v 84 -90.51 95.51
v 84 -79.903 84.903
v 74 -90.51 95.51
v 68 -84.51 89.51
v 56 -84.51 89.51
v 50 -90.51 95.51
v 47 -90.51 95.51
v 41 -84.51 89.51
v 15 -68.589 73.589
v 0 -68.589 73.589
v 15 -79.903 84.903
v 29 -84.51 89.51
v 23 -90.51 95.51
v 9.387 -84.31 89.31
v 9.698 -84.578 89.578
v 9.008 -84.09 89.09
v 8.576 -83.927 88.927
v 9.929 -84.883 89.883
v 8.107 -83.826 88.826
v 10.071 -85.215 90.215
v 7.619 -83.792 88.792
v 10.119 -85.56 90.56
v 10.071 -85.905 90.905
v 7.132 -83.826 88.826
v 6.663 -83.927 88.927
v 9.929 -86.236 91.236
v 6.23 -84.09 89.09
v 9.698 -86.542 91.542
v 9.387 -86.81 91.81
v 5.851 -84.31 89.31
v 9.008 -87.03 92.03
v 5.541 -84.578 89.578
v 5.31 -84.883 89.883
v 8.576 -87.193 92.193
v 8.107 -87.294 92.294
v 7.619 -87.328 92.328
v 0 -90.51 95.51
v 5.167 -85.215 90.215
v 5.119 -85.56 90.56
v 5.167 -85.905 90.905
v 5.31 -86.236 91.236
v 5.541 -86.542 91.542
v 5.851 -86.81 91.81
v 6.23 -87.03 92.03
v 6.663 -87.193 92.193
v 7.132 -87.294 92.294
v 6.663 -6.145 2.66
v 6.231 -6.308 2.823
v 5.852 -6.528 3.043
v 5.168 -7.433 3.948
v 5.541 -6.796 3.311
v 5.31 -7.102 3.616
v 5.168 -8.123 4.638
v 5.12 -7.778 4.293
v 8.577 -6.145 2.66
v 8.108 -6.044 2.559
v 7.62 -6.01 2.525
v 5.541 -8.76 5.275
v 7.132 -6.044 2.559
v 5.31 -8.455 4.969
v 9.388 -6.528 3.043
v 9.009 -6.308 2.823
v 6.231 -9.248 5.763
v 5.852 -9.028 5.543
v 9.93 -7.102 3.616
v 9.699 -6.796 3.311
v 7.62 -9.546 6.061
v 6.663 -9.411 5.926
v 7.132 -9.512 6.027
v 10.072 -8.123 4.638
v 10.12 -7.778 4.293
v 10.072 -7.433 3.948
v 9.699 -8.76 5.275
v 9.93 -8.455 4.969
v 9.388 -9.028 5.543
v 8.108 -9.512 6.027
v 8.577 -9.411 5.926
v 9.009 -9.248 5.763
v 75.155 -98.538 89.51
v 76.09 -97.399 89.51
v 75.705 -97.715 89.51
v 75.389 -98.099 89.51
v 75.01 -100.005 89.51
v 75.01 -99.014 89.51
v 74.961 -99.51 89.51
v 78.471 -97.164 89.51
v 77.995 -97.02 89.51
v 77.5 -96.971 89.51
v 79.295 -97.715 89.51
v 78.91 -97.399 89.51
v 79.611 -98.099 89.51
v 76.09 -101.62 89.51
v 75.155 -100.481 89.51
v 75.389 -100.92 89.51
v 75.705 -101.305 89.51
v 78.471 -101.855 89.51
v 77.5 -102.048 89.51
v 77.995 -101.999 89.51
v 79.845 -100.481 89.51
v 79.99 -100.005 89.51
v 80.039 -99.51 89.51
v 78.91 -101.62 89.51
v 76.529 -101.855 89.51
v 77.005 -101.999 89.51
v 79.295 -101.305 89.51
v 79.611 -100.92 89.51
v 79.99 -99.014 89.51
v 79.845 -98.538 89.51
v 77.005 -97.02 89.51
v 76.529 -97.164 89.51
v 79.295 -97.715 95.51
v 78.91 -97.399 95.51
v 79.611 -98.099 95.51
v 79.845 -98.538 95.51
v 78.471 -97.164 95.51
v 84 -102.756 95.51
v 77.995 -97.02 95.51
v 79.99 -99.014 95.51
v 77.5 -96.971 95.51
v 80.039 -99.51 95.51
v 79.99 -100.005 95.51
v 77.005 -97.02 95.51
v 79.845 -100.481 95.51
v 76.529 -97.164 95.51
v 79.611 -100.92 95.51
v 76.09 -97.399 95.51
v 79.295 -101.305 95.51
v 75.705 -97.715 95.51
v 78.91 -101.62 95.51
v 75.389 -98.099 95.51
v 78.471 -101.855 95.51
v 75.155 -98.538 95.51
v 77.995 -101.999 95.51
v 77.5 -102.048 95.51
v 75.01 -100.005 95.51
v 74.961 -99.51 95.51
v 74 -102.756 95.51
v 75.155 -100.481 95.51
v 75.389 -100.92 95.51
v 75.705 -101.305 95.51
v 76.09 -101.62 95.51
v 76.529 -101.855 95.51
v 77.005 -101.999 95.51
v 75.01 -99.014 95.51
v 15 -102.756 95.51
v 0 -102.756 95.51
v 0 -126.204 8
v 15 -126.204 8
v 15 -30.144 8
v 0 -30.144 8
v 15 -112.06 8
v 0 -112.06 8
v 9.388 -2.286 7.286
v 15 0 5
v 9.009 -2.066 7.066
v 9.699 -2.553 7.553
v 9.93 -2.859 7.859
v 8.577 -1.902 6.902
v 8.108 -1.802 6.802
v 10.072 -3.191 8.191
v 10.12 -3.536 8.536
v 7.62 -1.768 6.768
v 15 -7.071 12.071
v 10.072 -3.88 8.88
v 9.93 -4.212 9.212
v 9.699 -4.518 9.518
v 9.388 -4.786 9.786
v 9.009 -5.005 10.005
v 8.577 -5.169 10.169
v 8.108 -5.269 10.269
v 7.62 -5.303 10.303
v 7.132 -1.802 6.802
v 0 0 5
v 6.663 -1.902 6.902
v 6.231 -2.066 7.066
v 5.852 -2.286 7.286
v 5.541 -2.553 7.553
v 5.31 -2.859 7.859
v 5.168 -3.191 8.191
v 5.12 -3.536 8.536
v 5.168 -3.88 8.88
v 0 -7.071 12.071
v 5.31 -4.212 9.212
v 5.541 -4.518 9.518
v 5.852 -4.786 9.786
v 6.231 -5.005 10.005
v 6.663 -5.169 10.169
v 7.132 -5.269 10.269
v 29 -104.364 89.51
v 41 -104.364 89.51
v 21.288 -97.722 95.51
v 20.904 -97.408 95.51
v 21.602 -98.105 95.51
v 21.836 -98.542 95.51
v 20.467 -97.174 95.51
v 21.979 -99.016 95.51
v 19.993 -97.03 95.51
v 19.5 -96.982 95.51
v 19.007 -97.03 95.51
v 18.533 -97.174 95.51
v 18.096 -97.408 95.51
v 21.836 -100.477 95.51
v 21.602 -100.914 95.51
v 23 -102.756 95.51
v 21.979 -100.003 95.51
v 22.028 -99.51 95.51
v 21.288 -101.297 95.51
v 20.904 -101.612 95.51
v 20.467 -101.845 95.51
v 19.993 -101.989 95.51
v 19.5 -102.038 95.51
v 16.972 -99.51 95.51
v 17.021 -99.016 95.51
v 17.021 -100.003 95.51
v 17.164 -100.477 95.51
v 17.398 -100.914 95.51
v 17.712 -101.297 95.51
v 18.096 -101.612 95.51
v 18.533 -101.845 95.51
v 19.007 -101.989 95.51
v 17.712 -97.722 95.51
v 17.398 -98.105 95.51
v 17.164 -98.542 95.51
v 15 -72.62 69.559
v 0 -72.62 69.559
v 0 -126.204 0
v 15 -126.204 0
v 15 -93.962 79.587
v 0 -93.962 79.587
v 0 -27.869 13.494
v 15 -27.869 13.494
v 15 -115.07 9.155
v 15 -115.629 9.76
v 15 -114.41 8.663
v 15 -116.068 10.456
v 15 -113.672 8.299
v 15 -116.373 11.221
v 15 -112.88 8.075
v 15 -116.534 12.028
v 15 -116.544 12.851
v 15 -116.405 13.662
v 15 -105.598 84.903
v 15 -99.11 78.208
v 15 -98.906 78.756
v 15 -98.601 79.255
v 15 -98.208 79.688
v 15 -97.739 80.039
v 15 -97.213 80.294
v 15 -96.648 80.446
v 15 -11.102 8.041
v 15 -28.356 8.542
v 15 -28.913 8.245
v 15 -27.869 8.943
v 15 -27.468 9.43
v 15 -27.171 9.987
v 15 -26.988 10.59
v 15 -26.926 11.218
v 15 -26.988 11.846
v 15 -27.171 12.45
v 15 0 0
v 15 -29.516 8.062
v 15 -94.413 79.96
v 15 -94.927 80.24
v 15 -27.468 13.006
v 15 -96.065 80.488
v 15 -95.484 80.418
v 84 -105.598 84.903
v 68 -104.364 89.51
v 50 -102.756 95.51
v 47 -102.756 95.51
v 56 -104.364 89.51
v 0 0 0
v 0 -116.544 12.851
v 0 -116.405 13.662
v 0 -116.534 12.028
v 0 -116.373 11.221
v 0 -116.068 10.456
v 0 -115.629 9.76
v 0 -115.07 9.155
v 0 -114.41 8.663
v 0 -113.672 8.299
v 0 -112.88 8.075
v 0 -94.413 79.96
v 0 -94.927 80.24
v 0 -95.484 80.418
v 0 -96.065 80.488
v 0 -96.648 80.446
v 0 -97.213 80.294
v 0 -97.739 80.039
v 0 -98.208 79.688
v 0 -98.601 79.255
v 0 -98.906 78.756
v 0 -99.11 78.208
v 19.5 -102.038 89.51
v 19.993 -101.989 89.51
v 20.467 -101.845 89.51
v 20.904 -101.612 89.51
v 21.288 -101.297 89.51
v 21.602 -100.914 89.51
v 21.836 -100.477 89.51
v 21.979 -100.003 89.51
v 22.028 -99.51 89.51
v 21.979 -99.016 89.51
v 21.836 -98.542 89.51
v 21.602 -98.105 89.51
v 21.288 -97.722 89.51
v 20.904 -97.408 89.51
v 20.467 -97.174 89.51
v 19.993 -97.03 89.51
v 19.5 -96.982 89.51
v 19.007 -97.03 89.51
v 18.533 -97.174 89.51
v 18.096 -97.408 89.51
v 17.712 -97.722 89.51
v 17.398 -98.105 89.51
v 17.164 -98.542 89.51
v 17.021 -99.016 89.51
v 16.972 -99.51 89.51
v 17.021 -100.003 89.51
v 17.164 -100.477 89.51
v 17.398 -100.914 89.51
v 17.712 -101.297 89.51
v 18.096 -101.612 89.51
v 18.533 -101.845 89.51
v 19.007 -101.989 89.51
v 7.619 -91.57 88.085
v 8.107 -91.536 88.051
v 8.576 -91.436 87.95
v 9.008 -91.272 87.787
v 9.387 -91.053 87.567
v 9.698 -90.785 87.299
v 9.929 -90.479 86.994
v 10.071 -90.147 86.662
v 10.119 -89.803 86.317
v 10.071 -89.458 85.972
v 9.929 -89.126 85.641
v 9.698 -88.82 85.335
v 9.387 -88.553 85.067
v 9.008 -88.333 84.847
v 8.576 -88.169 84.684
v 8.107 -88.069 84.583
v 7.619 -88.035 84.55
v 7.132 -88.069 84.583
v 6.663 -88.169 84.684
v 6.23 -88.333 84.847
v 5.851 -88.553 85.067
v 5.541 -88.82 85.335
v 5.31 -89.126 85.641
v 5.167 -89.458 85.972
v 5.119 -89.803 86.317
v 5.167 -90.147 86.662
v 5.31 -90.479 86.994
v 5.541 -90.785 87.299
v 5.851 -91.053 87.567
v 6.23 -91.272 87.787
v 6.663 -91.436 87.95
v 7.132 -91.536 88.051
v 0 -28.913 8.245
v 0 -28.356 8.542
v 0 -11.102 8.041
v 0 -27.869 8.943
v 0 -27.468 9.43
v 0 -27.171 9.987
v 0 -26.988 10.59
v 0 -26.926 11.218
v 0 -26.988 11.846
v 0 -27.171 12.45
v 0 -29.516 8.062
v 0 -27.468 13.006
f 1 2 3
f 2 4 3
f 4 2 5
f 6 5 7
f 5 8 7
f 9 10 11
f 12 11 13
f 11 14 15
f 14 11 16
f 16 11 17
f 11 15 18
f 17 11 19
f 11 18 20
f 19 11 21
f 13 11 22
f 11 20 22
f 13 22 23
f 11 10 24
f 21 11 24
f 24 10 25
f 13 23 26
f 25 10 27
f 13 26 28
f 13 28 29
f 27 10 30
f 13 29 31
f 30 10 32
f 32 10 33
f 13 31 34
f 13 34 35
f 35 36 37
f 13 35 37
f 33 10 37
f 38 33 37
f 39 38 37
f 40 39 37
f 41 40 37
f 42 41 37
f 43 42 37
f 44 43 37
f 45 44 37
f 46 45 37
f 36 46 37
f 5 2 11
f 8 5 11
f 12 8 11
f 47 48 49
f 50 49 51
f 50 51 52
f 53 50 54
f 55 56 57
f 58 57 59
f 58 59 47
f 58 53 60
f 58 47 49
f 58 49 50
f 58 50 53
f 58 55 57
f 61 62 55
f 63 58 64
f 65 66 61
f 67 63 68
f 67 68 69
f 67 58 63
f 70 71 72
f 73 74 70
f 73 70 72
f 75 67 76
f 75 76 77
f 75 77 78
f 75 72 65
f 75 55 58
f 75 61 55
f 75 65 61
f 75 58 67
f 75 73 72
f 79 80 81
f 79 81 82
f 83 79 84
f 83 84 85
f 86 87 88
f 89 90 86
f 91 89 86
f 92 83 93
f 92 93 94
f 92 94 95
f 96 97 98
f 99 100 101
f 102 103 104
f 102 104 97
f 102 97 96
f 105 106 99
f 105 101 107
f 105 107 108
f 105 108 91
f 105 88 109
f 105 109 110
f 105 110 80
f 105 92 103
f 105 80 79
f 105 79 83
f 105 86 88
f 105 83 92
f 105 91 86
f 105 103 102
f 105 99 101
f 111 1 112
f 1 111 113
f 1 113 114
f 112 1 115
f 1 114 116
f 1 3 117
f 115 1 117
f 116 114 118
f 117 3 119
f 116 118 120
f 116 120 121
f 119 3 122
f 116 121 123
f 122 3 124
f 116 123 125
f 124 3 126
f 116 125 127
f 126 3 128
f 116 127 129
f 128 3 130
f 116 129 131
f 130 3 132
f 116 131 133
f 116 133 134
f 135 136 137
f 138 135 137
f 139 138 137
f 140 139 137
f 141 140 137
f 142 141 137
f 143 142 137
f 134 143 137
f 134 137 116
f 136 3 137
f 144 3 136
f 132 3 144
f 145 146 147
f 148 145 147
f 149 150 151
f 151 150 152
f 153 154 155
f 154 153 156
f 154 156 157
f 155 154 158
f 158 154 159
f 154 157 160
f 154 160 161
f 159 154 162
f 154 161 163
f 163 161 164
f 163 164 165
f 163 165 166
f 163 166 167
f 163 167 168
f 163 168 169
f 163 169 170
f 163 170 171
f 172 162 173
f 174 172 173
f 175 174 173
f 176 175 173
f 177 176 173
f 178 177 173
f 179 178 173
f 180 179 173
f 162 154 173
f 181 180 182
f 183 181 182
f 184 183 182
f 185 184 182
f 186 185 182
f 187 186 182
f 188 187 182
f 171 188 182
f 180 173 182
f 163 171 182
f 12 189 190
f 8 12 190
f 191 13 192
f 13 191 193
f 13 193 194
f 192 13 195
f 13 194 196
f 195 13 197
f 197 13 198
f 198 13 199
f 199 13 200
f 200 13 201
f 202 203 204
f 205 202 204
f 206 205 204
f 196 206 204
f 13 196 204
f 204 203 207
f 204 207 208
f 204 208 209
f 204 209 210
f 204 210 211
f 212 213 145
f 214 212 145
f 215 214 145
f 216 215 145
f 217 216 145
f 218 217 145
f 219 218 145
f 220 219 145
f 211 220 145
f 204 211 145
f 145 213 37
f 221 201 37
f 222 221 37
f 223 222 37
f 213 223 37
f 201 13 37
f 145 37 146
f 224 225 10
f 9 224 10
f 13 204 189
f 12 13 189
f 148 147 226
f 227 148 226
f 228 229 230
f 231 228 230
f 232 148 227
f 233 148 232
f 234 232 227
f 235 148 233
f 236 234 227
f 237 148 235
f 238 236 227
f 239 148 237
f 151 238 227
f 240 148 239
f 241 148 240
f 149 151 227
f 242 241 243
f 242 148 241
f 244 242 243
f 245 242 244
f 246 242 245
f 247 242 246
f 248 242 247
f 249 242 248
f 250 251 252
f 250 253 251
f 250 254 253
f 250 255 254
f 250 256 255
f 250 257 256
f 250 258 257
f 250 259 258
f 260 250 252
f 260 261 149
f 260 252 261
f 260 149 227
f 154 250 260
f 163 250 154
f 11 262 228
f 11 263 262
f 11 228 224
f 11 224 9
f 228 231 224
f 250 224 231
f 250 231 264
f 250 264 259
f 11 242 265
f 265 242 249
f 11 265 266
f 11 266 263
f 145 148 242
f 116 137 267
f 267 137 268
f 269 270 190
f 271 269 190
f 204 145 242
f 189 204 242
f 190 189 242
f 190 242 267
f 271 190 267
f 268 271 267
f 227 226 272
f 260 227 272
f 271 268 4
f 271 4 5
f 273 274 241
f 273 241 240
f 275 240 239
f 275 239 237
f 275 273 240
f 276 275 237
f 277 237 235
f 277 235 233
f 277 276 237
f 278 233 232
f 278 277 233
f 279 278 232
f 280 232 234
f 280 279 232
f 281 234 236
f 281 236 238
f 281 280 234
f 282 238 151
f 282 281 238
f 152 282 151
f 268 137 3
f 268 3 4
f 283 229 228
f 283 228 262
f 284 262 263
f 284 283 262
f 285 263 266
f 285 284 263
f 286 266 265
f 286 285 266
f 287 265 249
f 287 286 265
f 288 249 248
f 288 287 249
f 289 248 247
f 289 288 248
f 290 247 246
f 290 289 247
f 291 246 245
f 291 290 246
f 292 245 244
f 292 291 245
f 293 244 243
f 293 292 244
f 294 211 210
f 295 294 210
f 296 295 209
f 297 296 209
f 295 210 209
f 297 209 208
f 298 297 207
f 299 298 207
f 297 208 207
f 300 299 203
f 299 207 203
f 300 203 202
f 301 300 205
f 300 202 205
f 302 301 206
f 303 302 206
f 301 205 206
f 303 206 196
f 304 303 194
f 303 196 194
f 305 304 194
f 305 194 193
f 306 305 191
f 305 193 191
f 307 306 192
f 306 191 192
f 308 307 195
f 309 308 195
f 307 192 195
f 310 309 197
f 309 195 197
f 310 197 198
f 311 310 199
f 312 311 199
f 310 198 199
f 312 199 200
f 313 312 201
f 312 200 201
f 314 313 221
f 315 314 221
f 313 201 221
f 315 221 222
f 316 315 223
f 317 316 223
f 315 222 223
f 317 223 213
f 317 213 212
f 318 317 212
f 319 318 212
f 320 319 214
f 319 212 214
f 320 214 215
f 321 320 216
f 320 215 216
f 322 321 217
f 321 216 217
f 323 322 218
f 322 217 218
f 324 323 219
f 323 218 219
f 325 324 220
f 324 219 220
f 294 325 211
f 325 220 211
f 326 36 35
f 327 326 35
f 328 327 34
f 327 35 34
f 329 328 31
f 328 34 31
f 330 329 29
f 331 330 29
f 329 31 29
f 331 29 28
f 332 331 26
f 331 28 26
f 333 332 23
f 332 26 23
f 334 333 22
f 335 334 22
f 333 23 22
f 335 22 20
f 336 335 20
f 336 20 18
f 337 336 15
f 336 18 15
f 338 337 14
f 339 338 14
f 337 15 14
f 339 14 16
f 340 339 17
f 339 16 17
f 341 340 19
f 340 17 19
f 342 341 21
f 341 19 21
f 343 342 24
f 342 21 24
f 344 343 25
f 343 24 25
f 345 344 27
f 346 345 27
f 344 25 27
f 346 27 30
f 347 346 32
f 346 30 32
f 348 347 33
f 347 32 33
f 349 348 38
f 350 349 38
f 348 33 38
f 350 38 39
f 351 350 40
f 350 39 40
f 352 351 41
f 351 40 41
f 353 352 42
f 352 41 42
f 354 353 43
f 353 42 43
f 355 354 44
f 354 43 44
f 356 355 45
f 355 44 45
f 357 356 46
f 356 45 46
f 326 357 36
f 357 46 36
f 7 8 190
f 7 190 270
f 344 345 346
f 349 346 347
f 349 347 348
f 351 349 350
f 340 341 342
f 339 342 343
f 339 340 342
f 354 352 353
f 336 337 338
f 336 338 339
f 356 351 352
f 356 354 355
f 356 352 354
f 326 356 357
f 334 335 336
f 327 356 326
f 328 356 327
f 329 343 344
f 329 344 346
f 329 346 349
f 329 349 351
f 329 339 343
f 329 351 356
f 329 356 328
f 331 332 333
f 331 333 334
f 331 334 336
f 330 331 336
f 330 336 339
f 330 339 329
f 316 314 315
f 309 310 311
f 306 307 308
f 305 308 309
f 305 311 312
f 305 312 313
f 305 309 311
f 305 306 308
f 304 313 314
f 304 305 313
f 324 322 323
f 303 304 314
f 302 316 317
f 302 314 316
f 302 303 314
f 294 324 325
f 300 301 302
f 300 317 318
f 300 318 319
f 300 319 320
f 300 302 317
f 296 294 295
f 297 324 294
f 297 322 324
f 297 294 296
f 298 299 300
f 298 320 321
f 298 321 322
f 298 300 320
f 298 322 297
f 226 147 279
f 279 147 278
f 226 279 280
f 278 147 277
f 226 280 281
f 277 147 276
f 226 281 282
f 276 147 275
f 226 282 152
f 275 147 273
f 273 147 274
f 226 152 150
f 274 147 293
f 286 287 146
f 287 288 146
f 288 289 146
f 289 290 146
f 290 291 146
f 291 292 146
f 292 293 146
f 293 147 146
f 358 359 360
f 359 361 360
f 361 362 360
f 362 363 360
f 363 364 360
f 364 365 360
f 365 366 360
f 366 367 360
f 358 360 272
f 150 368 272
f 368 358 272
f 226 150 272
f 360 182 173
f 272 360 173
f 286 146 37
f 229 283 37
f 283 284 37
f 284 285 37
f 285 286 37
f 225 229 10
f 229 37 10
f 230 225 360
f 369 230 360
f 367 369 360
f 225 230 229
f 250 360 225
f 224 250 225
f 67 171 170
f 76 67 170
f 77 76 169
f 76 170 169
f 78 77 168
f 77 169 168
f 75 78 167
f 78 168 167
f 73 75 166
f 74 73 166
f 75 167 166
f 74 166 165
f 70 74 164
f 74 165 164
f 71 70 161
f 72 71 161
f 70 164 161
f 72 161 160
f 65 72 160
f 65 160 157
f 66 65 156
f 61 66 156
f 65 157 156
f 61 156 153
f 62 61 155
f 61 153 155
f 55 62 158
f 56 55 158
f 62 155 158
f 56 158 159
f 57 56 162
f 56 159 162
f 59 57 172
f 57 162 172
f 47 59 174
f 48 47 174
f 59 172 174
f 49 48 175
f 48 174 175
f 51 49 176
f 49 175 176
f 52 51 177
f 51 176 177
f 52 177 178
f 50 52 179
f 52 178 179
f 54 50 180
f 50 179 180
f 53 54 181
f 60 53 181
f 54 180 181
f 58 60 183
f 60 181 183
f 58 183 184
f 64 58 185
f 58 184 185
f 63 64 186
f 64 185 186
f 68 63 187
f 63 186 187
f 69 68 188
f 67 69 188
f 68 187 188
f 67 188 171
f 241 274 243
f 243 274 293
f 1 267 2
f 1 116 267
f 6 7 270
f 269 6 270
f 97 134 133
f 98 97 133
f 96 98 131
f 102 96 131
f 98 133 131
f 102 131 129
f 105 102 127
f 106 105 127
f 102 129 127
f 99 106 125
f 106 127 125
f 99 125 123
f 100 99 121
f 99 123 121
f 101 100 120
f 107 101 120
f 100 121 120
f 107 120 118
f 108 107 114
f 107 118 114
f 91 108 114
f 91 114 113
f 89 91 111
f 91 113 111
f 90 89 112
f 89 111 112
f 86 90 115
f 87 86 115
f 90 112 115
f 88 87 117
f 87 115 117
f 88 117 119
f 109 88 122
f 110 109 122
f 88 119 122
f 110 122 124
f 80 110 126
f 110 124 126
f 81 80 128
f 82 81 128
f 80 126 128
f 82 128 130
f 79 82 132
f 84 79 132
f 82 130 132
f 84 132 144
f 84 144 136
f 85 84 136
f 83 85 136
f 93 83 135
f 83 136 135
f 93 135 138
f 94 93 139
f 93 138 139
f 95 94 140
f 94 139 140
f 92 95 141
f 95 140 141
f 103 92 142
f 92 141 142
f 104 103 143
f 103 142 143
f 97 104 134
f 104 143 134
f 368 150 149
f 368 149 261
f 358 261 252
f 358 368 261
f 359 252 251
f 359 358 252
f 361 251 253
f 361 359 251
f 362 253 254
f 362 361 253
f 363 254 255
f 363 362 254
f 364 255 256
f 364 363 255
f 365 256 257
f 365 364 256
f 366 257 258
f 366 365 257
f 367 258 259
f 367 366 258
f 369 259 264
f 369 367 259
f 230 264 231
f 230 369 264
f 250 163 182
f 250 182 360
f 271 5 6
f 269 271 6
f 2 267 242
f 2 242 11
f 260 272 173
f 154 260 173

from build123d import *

# Parameters (mm, degrees)
PAD_DEPTH       = 15
SKETCH001_R     = 2.5
POCKET_DEPTH    = 6
PAD001_DEPTH    = 69
POCKET001_DEPTH = 0.001
POCKET002_DEPTH = 126.205435
SKETCH004_R     = 2.52796
SKETCH004_R_2   = 2.538571
POCKET003_DEPTH = 6


with BuildPart() as part:
    # Sketch → Pad (new body)
    with BuildSketch(Plane.YZ):
        Polygon((-126.204435, 0), (0, 0), (0, 5), (-7.071068, 12.071068), (-11.101576, 8.040559), (-72.619866, 69.558849), (-68.589358, 73.589358), (-90.509668, 95.509668), (-102.756291, 95.509668), (-126.204435, 8), align=None)
        with BuildLine():
            Line((-93.961967, 79.587241), (-27.868512, 13.493786))
            ThreePointArc((-30.144113, 8), (-27.170897, 9.986639), (-27.868512, 13.493786))
            Line((-30.144113, 8), (-112.060173, 8))
            ThreePointArc((-116.405015, 13.662309), (-115.628765, 9.759835), (-112.060173, 8))
            Line((-116.405015, 13.662309), (-99.110102, 78.207802))
            ThreePointArc((-93.961967, 79.587241), (-96.934244, 80.38366), (-99.110102, 78.207802))
        make_face(mode=Mode.SUBTRACT)
    extrude(amount=PAD_DEPTH)

    # Sketch001 (on Face8 of Pad) → Pocket (cut)
    with BuildSketch(Plane(origin=(0, 2.5, 2.5), x_dir=(0, -0.707107, 0.707107), z_dir=(0, 0.707107, 0.707107))):
        with Locations((8.535534, 7.61996)):
            Circle(SKETCH001_R)
        with Locations((124.535534, 7.619247)):
            Circle(SKETCH001_R)
    extrude(amount=-POCKET_DEPTH, mode=Mode.SUBTRACT)

    # Sketch002 (on Face5 of Pocket) → Pad001 (join)
    with BuildSketch(Plane.YZ.offset(15)):
        Polygon((-105.598321, 84.903066), (-79.903066, 84.903066), (-90.509668, 95.509668), (-102.756291, 95.509668), align=None)
    extrude(amount=PAD001_DEPTH)

    # Sketch003 → Pocket001 (cut, through all)
    with BuildSketch(Plane.XZ):
        Polygon((23, 95.509668), (29, 89.509668), (41, 89.509668), (47, 95.509668), align=None)
        Polygon((50, 95.509668), (74, 95.509668), (68, 89.509668), (56, 89.509668), align=None)
    extrude(amount=-POCKET001_DEPTH, mode=Mode.SUBTRACT)

    # Sketch003 → Pocket002 (cut, through all)
    with BuildSketch(Plane.XZ):
        Polygon((23, 95.509668), (29, 89.509668), (41, 89.509668), (47, 95.509668), align=None)
        Polygon((50, 95.509668), (74, 95.509668), (68, 89.509668), (56, 89.509668), align=None)
    extrude(amount=POCKET002_DEPTH, mode=Mode.SUBTRACT)

    # Sketch004 (on Face21 of Pocket002) → Pocket003 (cut)
    with BuildSketch(Plane(origin=(0, 0, 95.509668), x_dir=(0, -1, 0), z_dir=(0, 0, 1))):
        with Locations((99.509668, 19.5)):
            Circle(SKETCH004_R)
        with Locations((99.509668, 77.5)):
            Circle(SKETCH004_R_2)
    extrude(amount=-POCKET003_DEPTH, mode=Mode.SUBTRACT)


solid = part.part
